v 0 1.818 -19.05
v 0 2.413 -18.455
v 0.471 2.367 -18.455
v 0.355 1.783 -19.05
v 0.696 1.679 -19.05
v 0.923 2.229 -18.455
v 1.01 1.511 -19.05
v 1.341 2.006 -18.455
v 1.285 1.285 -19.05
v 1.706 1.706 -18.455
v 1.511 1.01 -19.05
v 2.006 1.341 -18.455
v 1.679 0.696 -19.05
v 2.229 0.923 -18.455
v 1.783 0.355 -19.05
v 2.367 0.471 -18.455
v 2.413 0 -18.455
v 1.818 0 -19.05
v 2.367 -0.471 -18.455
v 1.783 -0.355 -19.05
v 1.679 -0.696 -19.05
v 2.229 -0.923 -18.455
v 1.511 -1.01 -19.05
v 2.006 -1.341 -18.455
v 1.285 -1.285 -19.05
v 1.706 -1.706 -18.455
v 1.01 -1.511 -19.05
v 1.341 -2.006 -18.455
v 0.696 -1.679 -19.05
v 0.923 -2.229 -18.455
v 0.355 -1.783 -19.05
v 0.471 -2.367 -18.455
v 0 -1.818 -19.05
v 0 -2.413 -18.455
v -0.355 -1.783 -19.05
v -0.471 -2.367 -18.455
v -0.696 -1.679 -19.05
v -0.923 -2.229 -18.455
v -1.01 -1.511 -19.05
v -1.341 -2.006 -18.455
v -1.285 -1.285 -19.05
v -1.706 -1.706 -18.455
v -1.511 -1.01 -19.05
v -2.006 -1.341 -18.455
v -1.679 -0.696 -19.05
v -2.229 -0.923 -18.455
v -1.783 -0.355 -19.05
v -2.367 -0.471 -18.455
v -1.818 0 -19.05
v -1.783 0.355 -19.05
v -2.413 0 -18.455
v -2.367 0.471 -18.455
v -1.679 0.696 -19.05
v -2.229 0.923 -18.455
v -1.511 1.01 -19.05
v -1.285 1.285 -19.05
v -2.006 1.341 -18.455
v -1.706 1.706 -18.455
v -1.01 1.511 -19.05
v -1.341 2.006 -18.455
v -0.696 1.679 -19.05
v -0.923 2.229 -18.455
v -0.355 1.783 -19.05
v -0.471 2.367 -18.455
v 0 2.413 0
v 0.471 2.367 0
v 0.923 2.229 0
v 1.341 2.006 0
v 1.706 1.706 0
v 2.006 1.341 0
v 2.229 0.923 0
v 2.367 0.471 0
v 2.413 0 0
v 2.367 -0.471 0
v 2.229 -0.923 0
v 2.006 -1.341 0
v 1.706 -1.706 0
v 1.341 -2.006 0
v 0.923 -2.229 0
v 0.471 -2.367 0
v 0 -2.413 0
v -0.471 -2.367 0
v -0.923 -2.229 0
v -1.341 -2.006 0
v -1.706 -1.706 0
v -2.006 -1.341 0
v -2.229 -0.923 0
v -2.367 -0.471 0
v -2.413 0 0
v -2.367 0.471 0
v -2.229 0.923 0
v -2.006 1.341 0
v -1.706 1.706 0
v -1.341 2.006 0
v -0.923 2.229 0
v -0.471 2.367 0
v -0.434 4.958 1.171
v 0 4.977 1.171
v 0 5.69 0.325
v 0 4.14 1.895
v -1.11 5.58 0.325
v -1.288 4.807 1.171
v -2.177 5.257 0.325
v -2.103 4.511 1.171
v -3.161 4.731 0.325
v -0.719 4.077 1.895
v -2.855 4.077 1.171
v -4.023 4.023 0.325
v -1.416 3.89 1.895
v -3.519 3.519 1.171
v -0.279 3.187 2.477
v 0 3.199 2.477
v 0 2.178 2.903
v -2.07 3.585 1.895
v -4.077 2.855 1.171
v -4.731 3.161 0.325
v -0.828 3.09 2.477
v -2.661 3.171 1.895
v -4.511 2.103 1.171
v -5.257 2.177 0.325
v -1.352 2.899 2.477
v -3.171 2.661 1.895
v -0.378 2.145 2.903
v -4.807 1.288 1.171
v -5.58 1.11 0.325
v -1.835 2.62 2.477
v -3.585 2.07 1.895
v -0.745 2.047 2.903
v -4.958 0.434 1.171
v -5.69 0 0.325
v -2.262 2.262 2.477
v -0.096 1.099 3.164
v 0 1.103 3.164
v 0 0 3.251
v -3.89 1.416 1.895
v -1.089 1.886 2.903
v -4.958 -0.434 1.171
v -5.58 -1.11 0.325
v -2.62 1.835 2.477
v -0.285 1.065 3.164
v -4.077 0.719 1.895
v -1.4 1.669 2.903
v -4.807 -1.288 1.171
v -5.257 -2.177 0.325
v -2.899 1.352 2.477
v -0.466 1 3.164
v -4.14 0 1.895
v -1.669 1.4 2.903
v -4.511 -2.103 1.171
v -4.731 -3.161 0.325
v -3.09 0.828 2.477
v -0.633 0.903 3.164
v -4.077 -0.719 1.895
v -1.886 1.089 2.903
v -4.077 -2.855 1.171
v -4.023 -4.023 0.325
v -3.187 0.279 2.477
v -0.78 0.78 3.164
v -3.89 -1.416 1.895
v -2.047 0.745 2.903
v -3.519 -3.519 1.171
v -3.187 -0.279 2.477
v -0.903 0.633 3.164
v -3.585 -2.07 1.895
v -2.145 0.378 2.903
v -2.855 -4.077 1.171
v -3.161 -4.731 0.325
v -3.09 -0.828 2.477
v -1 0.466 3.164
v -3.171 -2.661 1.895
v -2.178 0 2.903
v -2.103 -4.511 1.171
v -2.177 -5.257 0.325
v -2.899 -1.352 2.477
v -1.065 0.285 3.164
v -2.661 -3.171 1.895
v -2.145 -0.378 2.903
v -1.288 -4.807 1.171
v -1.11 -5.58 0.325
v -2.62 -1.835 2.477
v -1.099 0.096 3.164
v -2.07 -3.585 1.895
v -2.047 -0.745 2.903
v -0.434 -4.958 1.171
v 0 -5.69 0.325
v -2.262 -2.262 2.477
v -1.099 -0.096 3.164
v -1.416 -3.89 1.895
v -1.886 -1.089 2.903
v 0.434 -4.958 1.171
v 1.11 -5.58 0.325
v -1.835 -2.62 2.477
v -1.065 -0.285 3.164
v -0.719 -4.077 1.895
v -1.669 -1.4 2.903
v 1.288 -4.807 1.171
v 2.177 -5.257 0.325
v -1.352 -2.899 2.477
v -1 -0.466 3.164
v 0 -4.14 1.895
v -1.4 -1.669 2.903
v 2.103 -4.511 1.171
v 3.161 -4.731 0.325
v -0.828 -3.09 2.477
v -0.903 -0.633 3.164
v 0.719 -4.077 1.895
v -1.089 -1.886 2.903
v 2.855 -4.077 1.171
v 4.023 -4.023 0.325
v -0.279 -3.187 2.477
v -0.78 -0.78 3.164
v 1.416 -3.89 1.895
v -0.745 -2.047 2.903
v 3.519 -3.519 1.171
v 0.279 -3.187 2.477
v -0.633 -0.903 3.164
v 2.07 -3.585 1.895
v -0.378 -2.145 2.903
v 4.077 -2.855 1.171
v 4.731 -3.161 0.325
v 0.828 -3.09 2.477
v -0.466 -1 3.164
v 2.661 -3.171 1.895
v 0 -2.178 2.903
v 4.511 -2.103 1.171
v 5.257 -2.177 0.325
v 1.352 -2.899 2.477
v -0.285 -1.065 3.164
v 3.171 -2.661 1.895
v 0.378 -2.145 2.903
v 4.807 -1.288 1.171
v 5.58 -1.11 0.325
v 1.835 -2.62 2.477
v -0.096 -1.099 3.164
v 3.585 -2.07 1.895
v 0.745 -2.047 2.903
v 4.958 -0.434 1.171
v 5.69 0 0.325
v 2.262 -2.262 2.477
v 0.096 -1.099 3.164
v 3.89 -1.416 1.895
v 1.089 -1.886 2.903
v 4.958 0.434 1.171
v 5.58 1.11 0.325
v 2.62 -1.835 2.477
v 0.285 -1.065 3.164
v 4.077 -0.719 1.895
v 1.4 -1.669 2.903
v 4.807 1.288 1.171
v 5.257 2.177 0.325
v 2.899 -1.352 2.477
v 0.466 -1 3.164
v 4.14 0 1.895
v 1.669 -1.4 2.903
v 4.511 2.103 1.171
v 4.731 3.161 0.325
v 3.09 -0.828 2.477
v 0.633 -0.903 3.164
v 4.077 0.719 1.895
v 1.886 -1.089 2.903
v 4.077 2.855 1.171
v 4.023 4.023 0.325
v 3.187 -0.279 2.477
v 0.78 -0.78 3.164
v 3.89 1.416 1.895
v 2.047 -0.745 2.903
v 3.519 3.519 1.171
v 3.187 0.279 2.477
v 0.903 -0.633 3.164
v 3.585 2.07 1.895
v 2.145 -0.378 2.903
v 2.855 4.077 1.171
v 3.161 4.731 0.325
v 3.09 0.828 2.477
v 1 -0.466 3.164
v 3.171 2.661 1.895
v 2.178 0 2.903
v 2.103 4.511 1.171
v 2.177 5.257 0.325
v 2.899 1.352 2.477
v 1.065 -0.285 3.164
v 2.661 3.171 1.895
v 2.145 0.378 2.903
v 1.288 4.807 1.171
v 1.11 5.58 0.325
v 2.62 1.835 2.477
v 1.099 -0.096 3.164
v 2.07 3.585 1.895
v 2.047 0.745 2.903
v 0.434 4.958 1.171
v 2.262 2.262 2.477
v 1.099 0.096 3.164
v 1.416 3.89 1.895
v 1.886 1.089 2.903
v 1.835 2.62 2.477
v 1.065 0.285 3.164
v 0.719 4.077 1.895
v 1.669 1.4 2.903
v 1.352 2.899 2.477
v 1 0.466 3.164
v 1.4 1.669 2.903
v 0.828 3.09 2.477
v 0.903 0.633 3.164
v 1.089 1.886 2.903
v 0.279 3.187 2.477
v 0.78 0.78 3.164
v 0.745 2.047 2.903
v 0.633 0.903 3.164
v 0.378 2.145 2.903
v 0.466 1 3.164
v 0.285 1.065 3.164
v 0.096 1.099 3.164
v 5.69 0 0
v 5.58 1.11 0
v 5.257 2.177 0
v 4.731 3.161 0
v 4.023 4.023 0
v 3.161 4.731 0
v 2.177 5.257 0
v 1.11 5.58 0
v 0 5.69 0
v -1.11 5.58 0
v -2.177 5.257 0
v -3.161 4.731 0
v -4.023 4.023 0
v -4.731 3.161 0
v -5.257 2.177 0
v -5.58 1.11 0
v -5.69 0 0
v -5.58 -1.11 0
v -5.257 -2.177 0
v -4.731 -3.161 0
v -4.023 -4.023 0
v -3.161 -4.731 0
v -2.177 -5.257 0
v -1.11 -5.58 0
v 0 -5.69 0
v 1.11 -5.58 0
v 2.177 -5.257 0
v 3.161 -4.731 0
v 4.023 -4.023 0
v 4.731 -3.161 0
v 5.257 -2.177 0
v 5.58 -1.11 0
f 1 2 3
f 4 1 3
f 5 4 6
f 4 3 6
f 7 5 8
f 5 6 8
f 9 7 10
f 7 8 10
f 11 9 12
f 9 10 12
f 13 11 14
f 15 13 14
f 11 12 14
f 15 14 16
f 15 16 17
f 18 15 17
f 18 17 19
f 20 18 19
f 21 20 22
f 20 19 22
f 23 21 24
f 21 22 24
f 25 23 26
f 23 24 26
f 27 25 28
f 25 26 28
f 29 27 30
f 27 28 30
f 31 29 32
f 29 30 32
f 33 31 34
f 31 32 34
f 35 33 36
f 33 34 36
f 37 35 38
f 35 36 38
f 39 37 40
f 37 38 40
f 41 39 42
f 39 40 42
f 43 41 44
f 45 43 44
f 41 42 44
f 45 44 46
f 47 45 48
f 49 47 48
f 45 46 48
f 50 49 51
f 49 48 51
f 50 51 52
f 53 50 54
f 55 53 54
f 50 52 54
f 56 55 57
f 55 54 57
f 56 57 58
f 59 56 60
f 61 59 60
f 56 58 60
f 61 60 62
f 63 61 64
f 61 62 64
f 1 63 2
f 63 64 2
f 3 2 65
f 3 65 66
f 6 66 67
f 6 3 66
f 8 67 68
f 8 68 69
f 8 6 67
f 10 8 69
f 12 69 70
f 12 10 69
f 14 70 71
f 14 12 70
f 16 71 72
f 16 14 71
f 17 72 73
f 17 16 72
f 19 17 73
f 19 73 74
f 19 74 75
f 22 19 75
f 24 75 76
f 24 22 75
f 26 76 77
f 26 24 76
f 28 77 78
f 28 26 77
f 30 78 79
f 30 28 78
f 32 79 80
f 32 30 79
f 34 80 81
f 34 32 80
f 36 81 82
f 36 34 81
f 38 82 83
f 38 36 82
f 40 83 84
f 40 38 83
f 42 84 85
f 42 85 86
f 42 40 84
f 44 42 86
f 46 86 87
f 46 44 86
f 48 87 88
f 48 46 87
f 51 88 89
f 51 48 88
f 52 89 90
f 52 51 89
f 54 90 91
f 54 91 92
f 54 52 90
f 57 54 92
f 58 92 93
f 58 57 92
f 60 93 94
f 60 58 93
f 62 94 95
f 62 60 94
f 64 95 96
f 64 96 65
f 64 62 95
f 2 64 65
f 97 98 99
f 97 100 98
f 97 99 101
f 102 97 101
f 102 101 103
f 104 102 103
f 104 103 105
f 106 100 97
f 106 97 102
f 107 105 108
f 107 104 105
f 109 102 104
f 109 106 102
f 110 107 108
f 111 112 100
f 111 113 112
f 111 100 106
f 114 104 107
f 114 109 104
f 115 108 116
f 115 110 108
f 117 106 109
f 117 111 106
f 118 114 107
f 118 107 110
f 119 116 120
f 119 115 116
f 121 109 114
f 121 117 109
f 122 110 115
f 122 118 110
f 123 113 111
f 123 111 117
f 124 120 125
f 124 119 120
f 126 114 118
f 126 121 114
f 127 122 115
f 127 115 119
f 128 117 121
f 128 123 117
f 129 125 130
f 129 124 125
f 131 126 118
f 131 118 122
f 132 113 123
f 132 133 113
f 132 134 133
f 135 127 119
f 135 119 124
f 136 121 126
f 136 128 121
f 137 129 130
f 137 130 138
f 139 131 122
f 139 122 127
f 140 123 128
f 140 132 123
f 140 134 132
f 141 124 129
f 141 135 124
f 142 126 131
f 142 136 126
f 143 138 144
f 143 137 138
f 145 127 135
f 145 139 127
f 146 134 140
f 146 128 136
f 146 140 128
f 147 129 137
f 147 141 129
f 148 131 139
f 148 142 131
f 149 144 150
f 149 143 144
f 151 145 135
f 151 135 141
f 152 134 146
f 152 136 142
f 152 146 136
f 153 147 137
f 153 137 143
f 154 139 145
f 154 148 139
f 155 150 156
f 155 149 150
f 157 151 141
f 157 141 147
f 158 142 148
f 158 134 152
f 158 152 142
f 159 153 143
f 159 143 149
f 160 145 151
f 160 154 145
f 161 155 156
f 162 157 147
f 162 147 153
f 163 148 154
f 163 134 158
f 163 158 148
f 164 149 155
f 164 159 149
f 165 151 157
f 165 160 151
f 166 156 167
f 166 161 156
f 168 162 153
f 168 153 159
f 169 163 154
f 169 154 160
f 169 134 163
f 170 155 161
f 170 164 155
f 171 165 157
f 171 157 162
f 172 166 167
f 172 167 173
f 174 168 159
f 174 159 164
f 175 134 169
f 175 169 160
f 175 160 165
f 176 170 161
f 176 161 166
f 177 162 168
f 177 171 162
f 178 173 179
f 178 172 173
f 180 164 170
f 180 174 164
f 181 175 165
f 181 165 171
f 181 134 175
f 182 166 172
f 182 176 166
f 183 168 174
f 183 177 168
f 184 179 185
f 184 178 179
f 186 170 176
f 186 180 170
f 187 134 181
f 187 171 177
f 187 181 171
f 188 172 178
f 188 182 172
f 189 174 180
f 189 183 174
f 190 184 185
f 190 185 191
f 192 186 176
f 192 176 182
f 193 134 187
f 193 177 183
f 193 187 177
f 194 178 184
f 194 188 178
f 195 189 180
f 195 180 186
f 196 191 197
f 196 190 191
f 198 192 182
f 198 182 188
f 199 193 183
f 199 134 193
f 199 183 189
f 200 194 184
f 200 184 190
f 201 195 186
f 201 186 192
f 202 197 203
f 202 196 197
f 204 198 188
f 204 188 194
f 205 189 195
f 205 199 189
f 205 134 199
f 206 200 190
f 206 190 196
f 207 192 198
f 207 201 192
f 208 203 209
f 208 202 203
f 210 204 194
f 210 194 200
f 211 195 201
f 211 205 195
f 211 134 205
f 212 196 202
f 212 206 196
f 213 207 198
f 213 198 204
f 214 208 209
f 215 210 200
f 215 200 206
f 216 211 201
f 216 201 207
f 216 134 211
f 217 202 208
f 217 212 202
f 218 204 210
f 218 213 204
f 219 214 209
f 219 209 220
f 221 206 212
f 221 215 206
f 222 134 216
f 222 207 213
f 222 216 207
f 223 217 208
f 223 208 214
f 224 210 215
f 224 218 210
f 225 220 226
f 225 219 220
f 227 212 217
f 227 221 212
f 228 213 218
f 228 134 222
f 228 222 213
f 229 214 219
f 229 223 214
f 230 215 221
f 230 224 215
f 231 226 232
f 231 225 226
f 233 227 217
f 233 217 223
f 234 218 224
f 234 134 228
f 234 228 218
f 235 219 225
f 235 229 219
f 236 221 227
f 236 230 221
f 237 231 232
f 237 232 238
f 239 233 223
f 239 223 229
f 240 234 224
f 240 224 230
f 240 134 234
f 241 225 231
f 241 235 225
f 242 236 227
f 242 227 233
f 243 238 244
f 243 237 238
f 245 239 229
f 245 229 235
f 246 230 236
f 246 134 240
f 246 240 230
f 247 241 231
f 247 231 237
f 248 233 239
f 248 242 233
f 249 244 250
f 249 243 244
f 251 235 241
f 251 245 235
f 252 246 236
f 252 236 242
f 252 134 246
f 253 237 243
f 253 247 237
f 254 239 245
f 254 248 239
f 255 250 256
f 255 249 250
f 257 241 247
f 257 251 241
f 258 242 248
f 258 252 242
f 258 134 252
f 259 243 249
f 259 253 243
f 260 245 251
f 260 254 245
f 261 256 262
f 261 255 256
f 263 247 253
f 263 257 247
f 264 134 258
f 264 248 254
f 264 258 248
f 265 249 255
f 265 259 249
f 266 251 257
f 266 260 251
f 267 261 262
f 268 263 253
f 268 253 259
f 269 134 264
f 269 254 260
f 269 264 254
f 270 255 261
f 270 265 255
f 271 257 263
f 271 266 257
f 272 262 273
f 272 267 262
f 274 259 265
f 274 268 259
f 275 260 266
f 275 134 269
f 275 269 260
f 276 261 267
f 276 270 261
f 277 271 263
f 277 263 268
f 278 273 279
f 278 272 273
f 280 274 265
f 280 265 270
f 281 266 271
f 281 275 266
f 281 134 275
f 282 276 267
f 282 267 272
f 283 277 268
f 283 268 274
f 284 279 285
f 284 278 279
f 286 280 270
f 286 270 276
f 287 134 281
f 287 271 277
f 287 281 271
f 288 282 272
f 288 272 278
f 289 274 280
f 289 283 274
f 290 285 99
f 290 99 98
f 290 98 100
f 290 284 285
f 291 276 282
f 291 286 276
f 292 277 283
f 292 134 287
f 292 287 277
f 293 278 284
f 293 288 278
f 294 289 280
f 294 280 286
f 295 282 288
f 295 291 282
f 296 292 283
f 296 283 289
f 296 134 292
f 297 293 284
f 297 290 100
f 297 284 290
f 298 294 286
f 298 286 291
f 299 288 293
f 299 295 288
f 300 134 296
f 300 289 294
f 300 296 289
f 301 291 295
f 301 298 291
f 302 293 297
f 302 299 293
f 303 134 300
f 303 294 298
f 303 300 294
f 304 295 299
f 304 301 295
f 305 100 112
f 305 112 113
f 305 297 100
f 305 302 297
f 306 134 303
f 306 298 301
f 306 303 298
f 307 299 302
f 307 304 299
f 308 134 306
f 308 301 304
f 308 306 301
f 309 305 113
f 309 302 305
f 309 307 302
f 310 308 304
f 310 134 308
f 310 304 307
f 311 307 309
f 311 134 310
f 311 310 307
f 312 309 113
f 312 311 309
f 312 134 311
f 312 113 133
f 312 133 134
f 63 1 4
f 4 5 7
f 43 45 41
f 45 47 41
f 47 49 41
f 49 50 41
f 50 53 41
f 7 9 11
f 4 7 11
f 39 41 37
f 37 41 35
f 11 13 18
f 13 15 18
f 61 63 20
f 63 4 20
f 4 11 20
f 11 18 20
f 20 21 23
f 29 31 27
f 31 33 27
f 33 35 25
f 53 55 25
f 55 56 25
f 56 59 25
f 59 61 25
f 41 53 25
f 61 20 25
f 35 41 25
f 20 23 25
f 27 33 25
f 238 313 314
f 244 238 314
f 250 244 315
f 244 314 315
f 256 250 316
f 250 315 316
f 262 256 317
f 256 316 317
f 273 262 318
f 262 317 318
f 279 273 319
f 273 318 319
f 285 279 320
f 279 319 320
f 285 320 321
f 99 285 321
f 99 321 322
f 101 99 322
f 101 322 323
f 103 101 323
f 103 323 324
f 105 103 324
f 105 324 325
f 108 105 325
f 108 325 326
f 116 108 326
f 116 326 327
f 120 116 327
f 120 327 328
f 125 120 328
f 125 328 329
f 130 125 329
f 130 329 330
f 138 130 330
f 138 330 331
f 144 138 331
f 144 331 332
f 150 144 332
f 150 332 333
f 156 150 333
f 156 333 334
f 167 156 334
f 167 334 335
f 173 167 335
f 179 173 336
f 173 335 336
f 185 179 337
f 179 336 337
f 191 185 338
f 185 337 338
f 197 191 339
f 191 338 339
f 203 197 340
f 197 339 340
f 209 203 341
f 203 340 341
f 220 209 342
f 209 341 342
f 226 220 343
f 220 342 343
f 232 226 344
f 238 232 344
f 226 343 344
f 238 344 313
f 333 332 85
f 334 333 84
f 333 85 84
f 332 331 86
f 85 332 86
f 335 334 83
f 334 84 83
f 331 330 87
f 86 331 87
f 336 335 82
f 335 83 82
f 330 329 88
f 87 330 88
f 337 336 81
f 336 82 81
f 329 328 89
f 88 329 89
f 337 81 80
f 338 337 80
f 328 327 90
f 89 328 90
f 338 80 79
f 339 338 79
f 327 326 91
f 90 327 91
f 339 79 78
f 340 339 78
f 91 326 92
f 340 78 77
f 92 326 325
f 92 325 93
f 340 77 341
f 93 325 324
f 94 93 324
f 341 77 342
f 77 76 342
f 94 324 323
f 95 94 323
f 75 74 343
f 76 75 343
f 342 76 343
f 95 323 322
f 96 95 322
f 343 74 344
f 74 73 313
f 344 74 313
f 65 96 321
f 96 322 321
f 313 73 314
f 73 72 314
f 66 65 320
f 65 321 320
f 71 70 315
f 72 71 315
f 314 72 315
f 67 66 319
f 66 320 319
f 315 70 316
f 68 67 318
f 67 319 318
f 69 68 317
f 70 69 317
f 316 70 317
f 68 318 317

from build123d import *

# Parameters (mm, degrees)
SKETCH1_R            = 5.6896
EXTRUDE3_DEPTH       = 3.2512
SKETCH4_W            = 19.05
SKETCH4_H            = 2.413
CHAMFER2_SIZE        = 0.5953125
EXTRUDE13_REACH      = 22.68
EXTRUDE13_END_RADIUS = 6.994595556
SKETCH26_R           = 0.5461


with BuildPart() as part:
    # Sketch1 → Extrude3 (new body)
    with BuildSketch(Plane.XY):
        Circle(SKETCH1_R)
    extrude(amount=EXTRUDE3_DEPTH)

    # Sketch11 → Cut-Revolve3 (revolve, cut)
    with BuildSketch(Plane(origin=(0, 0, 0), x_dir=(0, 0, -1), z_dir=(1, 0, 0))):
        with BuildLine():
            Line((-3.5052, 6.82752), (0, 6.82752))
            Line((0, 6.82752), (0, 5.6896))
            Line((0, 5.6896), (-0.32512, 5.6896))
            ThreePointArc((-0.32512, 5.6896), (-2.476812954, 3.198964376), (-3.2512, 0))
            Line((-3.2512, 0), (-3.5052, 0))
            Line((-3.5052, 0), (-3.5052, 6.82752))
        make_face()
    revolve(axis=Axis((0, 0, 0), (0, 0, 1)), mode=Mode.SUBTRACT)



with BuildPart() as body_2:
    # Sketch4 → Revolve1 (revolve)
    with BuildSketch(Plane(origin=(0, 0, 0), x_dir=(0, 0, -1), z_dir=(1, 0, 0))):
        with Locations((9.525, 1.2065)):
            Rectangle(SKETCH4_W, SKETCH4_H)
    revolve(axis=Axis((0, 0, 0), (0, 0, -1)))

    # Chamfer2
    chamfer2_edges = [body_2.edges().sort_by_distance(p)[0] for p in [
        (0, -2.413, -19.05),
    ]]
    chamfer(chamfer2_edges, length=CHAMFER2_SIZE)


with BuildPart() as part_1:
    add(part.part)

    add(body_2.part)  # Extrude13 merges body 2
    # Extrude13: up to this sphere (the profile starts inside it)
    extrude13_end = Location((0, 0, -3.743395556)) * Sphere(EXTRUDE13_END_RADIUS, mode=Mode.PRIVATE)
    # Sketch26 → Extrude13 (add, up to the surface)
    with BuildSketch(Plane.XY, mode=Mode.PRIVATE) as extrude13_sk1:
        Circle(SKETCH26_R)
    extrude13_tool1 = extrude(extrude13_sk1.sketch, amount=EXTRUDE13_REACH, mode=Mode.PRIVATE) & extrude13_end
    add(extrude13_tool1.solids().sort_by_distance((0, 0, 0))[0])


solid = part_1.part
